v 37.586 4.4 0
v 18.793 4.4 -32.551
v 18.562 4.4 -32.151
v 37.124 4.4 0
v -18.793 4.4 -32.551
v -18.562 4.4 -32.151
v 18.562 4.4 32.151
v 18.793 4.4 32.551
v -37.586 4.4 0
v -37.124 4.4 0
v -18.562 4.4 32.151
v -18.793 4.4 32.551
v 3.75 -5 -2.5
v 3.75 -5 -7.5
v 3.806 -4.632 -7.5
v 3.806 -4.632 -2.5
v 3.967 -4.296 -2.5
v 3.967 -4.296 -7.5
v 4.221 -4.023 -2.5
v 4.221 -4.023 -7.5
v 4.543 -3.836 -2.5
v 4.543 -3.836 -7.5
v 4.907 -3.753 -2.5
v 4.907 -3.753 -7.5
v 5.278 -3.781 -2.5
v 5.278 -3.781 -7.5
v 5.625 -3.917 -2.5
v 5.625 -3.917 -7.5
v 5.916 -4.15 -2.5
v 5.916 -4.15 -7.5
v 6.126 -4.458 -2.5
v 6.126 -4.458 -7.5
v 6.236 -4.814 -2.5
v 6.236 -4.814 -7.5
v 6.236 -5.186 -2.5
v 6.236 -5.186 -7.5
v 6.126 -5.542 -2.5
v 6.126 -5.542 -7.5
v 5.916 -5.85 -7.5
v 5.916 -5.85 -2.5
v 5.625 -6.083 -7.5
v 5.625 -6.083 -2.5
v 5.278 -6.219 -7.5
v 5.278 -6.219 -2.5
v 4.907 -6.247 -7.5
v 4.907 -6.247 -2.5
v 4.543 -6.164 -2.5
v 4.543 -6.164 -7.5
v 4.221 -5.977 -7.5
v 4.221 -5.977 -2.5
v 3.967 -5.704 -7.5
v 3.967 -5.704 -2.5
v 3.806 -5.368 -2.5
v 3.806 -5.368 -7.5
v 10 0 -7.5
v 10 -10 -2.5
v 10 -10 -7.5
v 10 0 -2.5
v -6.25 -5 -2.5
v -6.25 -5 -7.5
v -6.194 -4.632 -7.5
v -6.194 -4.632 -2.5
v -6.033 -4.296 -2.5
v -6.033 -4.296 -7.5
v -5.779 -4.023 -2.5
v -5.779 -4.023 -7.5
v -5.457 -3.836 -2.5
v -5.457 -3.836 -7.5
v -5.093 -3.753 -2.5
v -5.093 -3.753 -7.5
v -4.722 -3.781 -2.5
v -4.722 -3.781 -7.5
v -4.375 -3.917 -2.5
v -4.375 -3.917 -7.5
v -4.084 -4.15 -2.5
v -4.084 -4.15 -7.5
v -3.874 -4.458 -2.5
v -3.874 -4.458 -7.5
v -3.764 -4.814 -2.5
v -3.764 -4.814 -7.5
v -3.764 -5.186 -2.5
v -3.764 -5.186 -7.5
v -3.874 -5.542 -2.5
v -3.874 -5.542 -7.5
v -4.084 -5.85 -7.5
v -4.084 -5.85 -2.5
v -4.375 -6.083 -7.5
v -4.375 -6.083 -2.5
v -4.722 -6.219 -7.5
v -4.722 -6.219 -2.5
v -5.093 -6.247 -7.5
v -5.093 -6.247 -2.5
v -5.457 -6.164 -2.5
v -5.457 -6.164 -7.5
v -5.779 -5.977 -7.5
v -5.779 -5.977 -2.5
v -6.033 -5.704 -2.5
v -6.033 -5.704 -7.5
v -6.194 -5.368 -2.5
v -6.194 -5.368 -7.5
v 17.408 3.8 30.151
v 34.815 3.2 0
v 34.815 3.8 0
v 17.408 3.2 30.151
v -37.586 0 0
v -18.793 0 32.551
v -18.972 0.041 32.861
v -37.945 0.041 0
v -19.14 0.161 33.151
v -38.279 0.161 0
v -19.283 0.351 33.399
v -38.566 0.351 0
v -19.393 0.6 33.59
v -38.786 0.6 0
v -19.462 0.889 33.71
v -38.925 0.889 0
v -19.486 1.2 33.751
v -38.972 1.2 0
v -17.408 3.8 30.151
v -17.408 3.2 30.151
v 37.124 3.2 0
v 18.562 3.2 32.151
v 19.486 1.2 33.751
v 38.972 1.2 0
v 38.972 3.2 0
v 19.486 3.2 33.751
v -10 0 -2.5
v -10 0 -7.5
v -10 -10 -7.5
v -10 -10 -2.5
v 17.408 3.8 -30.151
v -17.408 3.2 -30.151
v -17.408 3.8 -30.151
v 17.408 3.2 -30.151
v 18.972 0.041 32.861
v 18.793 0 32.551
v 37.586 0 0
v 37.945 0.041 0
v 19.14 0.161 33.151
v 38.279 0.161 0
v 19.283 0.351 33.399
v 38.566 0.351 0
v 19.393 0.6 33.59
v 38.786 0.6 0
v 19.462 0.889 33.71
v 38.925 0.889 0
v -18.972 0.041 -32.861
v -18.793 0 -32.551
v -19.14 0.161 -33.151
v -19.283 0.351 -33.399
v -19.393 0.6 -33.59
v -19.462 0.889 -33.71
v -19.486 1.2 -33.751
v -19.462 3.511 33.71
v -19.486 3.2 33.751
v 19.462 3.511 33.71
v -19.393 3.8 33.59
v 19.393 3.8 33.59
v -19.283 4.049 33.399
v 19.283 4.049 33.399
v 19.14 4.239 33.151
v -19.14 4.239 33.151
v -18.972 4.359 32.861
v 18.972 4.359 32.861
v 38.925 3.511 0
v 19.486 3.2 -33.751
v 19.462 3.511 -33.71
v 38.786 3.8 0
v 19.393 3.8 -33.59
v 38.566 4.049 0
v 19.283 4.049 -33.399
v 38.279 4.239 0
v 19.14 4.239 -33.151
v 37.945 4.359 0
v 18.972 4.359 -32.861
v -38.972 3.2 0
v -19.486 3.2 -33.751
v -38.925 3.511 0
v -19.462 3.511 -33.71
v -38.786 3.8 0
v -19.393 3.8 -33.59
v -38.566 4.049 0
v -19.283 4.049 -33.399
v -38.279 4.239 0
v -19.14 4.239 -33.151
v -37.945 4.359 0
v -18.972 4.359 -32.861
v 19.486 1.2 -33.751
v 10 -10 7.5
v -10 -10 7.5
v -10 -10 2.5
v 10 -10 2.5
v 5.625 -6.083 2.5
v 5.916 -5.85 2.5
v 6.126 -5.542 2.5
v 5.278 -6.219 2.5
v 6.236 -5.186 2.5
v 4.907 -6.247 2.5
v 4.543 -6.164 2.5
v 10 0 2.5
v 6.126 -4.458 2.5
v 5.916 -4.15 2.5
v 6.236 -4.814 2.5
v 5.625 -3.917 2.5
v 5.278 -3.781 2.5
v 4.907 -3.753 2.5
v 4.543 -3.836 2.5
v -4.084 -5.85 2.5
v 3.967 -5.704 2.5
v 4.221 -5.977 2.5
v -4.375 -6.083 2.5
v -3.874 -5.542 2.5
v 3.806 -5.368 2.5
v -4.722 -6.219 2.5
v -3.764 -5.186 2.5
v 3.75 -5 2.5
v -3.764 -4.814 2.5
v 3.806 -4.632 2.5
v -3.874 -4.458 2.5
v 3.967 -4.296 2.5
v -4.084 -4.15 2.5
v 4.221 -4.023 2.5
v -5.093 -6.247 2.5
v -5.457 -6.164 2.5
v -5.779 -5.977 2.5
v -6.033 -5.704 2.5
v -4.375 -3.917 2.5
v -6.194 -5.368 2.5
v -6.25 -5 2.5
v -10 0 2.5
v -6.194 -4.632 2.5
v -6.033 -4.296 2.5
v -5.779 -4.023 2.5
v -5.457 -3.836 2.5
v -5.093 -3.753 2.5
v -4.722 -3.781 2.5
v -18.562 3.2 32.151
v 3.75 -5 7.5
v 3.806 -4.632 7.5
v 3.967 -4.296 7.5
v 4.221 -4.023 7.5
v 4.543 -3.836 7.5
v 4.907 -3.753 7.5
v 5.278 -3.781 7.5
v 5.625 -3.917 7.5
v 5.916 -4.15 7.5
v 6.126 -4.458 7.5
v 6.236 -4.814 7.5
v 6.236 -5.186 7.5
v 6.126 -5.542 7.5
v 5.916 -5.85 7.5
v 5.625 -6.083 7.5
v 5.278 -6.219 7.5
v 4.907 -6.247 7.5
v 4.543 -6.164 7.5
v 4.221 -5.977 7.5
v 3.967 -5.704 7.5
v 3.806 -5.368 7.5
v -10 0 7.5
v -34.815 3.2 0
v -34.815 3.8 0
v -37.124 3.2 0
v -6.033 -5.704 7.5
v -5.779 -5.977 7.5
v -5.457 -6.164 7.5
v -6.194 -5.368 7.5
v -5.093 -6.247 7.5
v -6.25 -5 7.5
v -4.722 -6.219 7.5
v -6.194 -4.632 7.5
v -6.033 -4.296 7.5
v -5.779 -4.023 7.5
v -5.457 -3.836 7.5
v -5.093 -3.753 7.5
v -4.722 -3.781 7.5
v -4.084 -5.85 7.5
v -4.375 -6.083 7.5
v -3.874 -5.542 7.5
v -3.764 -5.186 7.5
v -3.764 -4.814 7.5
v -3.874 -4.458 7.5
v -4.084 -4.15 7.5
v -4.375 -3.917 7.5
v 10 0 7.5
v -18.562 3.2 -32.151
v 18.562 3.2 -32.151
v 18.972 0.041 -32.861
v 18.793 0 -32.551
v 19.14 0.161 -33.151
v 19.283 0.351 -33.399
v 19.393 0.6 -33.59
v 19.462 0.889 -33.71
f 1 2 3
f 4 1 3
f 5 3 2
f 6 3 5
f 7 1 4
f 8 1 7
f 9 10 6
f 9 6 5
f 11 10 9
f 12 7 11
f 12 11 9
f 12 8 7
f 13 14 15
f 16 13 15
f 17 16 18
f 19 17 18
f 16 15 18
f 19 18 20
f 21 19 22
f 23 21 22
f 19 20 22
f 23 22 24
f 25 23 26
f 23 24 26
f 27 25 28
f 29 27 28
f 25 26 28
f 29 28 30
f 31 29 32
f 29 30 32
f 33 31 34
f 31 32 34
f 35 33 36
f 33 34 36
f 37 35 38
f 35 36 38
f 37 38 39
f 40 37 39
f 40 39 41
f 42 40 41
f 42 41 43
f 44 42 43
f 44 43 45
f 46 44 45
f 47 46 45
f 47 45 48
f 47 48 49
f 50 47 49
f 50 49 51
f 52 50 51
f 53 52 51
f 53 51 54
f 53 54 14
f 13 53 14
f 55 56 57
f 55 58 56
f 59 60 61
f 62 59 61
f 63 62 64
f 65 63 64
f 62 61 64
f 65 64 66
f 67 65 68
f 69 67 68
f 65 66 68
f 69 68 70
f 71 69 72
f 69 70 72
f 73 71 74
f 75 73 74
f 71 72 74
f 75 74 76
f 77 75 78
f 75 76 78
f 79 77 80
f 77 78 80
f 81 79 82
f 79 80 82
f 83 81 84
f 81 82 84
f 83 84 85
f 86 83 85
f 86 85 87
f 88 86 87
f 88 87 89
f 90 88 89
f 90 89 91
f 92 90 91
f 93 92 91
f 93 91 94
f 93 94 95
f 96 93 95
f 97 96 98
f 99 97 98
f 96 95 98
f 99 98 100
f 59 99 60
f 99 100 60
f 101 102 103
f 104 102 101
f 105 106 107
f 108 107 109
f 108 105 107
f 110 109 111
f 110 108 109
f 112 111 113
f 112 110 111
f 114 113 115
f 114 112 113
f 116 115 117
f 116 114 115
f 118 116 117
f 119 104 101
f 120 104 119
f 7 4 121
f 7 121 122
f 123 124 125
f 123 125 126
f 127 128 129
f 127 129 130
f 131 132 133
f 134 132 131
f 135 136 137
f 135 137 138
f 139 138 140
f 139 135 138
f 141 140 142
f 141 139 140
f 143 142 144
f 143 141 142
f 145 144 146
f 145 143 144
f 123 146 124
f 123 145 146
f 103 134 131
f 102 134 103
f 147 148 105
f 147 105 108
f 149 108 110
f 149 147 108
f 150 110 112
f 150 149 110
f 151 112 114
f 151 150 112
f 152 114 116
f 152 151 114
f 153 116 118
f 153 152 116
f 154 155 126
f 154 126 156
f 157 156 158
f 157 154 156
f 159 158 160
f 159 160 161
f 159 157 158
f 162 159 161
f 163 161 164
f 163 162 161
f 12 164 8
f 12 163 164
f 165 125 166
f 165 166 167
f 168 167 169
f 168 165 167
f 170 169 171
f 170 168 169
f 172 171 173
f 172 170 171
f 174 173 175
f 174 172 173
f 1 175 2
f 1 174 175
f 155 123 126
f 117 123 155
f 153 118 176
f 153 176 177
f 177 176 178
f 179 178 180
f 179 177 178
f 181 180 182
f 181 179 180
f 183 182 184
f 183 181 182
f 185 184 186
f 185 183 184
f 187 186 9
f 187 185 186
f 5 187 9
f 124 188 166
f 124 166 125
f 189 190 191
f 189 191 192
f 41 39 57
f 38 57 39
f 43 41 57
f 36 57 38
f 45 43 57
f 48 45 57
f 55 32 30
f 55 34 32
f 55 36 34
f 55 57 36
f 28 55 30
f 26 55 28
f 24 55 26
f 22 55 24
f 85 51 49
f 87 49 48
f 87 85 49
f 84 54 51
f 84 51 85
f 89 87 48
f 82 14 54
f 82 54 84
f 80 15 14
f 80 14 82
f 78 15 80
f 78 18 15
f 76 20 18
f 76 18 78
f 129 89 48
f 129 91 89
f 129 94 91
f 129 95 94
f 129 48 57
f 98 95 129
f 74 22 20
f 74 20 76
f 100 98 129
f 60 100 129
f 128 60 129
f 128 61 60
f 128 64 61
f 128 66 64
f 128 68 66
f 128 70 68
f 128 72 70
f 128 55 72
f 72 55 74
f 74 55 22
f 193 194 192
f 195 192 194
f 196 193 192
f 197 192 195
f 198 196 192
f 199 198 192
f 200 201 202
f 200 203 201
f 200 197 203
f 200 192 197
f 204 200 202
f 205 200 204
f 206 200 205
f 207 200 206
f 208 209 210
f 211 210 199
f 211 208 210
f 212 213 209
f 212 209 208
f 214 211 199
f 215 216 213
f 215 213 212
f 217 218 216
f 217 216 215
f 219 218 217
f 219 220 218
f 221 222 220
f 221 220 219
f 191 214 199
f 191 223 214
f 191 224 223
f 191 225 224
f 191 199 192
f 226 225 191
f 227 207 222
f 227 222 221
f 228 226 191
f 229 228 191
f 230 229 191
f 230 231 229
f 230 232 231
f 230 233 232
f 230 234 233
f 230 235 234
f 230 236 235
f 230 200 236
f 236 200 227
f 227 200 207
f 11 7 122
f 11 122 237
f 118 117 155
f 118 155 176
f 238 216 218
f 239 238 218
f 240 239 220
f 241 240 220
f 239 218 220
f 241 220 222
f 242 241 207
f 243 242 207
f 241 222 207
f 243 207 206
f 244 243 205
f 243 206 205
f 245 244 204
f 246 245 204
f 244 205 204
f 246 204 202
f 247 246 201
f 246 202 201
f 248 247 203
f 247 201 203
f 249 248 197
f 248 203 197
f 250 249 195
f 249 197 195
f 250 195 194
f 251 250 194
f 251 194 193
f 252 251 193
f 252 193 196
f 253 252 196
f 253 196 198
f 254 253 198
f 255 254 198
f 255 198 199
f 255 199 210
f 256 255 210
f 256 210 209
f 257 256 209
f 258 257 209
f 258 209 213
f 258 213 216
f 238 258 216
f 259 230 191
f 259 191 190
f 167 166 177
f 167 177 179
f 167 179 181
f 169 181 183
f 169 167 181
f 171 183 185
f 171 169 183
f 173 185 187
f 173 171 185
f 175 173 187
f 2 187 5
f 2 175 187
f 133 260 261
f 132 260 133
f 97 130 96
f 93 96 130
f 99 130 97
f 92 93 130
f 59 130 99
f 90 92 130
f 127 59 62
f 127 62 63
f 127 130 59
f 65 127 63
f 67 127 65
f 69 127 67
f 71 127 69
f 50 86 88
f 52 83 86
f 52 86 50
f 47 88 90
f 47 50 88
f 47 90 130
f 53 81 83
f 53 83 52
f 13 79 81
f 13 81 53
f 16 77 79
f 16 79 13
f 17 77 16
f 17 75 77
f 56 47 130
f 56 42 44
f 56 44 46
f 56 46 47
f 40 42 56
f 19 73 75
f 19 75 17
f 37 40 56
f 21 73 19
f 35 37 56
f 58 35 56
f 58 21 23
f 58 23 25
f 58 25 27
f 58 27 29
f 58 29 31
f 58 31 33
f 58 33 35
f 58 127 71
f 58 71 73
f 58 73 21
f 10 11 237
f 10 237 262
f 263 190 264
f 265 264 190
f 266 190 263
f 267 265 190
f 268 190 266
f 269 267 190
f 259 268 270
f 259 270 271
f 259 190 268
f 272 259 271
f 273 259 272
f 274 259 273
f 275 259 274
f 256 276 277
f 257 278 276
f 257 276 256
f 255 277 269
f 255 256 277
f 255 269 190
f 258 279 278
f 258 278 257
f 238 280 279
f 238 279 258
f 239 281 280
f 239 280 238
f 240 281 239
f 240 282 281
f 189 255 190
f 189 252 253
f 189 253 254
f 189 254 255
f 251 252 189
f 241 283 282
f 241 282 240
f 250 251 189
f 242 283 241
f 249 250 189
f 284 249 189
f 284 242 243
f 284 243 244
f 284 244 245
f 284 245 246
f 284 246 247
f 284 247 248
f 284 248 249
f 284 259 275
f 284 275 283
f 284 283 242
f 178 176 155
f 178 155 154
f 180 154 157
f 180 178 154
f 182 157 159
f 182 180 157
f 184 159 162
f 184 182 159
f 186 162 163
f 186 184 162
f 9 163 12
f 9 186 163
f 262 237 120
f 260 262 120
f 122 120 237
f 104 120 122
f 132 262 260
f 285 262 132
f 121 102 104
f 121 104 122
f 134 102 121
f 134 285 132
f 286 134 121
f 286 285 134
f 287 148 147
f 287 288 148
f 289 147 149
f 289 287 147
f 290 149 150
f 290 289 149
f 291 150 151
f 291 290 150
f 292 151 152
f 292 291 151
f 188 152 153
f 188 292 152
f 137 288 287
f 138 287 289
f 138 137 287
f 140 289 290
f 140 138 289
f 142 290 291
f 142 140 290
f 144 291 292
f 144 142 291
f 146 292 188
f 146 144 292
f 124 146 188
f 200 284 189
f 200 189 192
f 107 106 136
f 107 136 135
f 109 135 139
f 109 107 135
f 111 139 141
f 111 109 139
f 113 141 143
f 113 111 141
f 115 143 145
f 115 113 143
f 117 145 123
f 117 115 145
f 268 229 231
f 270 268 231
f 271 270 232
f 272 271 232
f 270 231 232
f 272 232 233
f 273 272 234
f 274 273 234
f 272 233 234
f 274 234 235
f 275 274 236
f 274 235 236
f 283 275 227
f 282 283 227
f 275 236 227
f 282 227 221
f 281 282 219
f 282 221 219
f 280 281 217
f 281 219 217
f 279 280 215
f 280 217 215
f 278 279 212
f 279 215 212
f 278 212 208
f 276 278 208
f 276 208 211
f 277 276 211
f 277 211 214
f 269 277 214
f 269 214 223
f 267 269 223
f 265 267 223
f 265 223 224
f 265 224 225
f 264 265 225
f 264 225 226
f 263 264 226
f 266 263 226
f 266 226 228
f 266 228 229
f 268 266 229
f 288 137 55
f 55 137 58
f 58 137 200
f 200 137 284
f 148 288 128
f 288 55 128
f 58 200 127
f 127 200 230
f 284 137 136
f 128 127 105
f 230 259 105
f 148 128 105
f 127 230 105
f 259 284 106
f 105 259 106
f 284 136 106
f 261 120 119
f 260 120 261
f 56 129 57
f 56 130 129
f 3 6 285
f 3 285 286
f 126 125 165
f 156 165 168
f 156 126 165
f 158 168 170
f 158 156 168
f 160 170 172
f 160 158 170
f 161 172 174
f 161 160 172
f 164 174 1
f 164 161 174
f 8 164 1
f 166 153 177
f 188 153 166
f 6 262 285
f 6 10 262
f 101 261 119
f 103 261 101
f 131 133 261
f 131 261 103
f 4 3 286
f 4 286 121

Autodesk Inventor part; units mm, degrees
ref_plane "YZ Plane" through (0, 0, 0) normal (1, 0, 0) x (0, 1, 0)
ref_plane "XZ Plane" through (0, 0, 0) normal (0, 1, 0) x (-1, 0, 0)
ref_plane "XY Plane" through (0, 0, 0) normal (0, 0, 1) x (1, 0, 0)
sketch "스케치1" plane through (0, 0, 0) normal (0, 1, 0) x (-1, 0, 0)
  line L0 (17.6385, -30.5508) -> (-17.6385, -30.5508)
  line L1 (-17.6385, -30.5508) -> (-35.277, 0)
  line L2 (-35.277, 0) -> (-17.6385, 30.5508)
  line L3 (-17.6385, 30.5508) -> (17.6385, 30.5508)
  line L4 (17.6385, 30.5508) -> (35.277, 0)
  line L5 (35.277, 0) -> (17.6385, -30.5508)
  line L6 (19.486, -33.7508) -> (-19.486, -33.7508)
  line L7 (-19.486, -33.7508) -> (-38.972, 0)
  line L8 (-38.972, 0) -> (-19.486, 33.7508)
  line L9 (-19.486, 33.7508) -> (19.486, 33.7508)
  line L10 (19.486, 33.7508) -> (38.972, 0)
  line L11 (38.972, 0) -> (19.486, -33.7508)
  point P0 (0, 0)
  point P1 (0, 0)
  point P2 (0, 0)
  dimension "d0" = 70.554
  dimension "d1" = 3.2
extrude "돌출1" add sketch "스케치1" along normal blind 4.4 contours L0 L1 L2 L3 L4 L5 | L6 L7 L8 L9 L10 L11
sketch "스케치2" plane through (0, 4.4, 0) normal (0, 1, 0) x (1, 0, 0)
  line L0 (-18.5623, 32.1508) -> (18.5623, 32.1508)
  line L1 (18.5623, 32.1508) -> (37.1245, 0)
  line L2 (37.1245, 0) -> (18.5623, -32.1508)
  line L3 (18.5623, -32.1508) -> (-18.5623, -32.1508)
  line L4 (-18.5623, -32.1508) -> (-37.1245, 0)
  line L5 (-37.1245, 0) -> (-18.5623, 32.1508)
  line L6 (-19.486, 33.7508) -> (-38.972, 0) projected
  point P0 (0, 0)
  point P1 (0, 0)
  dimension "d4" = 1.6
extrude "돌출2" cut sketch "스케치2" against normal blind 1.2
sketch "스케치3" plane through (0, 3.2, 0) normal (0, 1, 0) x (1, 0, 0)
  line L0 (17.4076, -30.1508) -> (-17.4076, -30.1508)
  line L1 (-17.4076, -30.1508) -> (-34.8151, 0)
  line L2 (-34.8151, 0) -> (-17.4076, 30.1508)
  line L3 (-17.4076, 30.1508) -> (17.4076, 30.1508)
  line L4 (17.4076, 30.1508) -> (34.8151, 0)
  line L5 (34.8151, 0) -> (17.4076, -30.1508)
  line L6 (-18.5623, 32.1508) -> (18.5623, 32.1508) projected
  point P0 (0, 0)
  point P1 (0, 0)
  dimension "d7" = 2
extrude "돌출3" add sketch "스케치3" along normal blind 0.6
fillet "모깎기1" radius 1.2 12 edges at (0, 4.4, -33.7508) (0, 0, -33.7508) (-29.229, 4.4, -16.8754) (-29.229, 0, -16.8754) (-29.229, 4.4, 16.8754) (-29.229, 0, 16.8754) (0, 0, 33.7508) (0, 4.4, 33.7508) (29.229, 0, 16.8754) (29.229, 4.4, 16.8754) (29.229, 4.4, -16.8754) (29.229, 0, -16.8754)
sketch "스케치4" plane through (0, 0, 0) normal (0, -1, 0) x (1, 0, 0)
  line L0 (10, -7.5) -> (-10, -7.5)
  line L1 (-10, -7.5) -> (-10, -2.5)
  line L2 (-10, -2.5) -> (10, -2.5)
  line L3 (10, -2.5) -> (10, -7.5)
  line L4 (10, -7.5) -> (-10, -2.5) construction
  line L5 (-10, -7.5) -> (10, -2.5) construction
  line L6 (10, 2.5) -> (-10, 2.5)
  line L7 (-10, 2.5) -> (-10, 7.5)
  line L8 (-10, 7.5) -> (10, 7.5)
  line L9 (10, 7.5) -> (10, 2.5)
  line L10 (10, 2.5) -> (-10, 7.5) construction
  line L11 (-10, 2.5) -> (10, 7.5) construction
  point P0 (0, 0)
  point P1 (0, -5)
  point P2 (0, 5)
  dimension "d11" = 20
  dimension "d12" = 5
  dimension "d13" = 20
  dimension "d14" = 5
  dimension "d16" = 5
  dimension "d17" = 2.5
extrude "돌출4" add sketch "스케치4" along normal blind 10
sketch "스케치5" plane through (10, 0, -7.5) normal (0, 0, -1) x (-1, 0, 0)
  circle A0 centre (15, -5) radius 1.25
  circle A1 centre (5, -5) radius 1.25
  line L0 (0, 0) -> (0, -10) projected
  line L1 (-8.7932, 0) -> (28.7932, 0) projected
  point P0 (10, 0)
  point P1 (0, -5)
  dimension "d20" = 2.5
  dimension "d21" = 2.5
  dimension "d22" = 5
  dimension "d23" = 5
  dimension "d24" = 10
extrude "돌출5" cut sketch "스케치5" against normal up to surface (15 mm away)
equation "\"d17\" = 0.5 * d16"
properties part number "OV-PAM_n_6_bottom"
